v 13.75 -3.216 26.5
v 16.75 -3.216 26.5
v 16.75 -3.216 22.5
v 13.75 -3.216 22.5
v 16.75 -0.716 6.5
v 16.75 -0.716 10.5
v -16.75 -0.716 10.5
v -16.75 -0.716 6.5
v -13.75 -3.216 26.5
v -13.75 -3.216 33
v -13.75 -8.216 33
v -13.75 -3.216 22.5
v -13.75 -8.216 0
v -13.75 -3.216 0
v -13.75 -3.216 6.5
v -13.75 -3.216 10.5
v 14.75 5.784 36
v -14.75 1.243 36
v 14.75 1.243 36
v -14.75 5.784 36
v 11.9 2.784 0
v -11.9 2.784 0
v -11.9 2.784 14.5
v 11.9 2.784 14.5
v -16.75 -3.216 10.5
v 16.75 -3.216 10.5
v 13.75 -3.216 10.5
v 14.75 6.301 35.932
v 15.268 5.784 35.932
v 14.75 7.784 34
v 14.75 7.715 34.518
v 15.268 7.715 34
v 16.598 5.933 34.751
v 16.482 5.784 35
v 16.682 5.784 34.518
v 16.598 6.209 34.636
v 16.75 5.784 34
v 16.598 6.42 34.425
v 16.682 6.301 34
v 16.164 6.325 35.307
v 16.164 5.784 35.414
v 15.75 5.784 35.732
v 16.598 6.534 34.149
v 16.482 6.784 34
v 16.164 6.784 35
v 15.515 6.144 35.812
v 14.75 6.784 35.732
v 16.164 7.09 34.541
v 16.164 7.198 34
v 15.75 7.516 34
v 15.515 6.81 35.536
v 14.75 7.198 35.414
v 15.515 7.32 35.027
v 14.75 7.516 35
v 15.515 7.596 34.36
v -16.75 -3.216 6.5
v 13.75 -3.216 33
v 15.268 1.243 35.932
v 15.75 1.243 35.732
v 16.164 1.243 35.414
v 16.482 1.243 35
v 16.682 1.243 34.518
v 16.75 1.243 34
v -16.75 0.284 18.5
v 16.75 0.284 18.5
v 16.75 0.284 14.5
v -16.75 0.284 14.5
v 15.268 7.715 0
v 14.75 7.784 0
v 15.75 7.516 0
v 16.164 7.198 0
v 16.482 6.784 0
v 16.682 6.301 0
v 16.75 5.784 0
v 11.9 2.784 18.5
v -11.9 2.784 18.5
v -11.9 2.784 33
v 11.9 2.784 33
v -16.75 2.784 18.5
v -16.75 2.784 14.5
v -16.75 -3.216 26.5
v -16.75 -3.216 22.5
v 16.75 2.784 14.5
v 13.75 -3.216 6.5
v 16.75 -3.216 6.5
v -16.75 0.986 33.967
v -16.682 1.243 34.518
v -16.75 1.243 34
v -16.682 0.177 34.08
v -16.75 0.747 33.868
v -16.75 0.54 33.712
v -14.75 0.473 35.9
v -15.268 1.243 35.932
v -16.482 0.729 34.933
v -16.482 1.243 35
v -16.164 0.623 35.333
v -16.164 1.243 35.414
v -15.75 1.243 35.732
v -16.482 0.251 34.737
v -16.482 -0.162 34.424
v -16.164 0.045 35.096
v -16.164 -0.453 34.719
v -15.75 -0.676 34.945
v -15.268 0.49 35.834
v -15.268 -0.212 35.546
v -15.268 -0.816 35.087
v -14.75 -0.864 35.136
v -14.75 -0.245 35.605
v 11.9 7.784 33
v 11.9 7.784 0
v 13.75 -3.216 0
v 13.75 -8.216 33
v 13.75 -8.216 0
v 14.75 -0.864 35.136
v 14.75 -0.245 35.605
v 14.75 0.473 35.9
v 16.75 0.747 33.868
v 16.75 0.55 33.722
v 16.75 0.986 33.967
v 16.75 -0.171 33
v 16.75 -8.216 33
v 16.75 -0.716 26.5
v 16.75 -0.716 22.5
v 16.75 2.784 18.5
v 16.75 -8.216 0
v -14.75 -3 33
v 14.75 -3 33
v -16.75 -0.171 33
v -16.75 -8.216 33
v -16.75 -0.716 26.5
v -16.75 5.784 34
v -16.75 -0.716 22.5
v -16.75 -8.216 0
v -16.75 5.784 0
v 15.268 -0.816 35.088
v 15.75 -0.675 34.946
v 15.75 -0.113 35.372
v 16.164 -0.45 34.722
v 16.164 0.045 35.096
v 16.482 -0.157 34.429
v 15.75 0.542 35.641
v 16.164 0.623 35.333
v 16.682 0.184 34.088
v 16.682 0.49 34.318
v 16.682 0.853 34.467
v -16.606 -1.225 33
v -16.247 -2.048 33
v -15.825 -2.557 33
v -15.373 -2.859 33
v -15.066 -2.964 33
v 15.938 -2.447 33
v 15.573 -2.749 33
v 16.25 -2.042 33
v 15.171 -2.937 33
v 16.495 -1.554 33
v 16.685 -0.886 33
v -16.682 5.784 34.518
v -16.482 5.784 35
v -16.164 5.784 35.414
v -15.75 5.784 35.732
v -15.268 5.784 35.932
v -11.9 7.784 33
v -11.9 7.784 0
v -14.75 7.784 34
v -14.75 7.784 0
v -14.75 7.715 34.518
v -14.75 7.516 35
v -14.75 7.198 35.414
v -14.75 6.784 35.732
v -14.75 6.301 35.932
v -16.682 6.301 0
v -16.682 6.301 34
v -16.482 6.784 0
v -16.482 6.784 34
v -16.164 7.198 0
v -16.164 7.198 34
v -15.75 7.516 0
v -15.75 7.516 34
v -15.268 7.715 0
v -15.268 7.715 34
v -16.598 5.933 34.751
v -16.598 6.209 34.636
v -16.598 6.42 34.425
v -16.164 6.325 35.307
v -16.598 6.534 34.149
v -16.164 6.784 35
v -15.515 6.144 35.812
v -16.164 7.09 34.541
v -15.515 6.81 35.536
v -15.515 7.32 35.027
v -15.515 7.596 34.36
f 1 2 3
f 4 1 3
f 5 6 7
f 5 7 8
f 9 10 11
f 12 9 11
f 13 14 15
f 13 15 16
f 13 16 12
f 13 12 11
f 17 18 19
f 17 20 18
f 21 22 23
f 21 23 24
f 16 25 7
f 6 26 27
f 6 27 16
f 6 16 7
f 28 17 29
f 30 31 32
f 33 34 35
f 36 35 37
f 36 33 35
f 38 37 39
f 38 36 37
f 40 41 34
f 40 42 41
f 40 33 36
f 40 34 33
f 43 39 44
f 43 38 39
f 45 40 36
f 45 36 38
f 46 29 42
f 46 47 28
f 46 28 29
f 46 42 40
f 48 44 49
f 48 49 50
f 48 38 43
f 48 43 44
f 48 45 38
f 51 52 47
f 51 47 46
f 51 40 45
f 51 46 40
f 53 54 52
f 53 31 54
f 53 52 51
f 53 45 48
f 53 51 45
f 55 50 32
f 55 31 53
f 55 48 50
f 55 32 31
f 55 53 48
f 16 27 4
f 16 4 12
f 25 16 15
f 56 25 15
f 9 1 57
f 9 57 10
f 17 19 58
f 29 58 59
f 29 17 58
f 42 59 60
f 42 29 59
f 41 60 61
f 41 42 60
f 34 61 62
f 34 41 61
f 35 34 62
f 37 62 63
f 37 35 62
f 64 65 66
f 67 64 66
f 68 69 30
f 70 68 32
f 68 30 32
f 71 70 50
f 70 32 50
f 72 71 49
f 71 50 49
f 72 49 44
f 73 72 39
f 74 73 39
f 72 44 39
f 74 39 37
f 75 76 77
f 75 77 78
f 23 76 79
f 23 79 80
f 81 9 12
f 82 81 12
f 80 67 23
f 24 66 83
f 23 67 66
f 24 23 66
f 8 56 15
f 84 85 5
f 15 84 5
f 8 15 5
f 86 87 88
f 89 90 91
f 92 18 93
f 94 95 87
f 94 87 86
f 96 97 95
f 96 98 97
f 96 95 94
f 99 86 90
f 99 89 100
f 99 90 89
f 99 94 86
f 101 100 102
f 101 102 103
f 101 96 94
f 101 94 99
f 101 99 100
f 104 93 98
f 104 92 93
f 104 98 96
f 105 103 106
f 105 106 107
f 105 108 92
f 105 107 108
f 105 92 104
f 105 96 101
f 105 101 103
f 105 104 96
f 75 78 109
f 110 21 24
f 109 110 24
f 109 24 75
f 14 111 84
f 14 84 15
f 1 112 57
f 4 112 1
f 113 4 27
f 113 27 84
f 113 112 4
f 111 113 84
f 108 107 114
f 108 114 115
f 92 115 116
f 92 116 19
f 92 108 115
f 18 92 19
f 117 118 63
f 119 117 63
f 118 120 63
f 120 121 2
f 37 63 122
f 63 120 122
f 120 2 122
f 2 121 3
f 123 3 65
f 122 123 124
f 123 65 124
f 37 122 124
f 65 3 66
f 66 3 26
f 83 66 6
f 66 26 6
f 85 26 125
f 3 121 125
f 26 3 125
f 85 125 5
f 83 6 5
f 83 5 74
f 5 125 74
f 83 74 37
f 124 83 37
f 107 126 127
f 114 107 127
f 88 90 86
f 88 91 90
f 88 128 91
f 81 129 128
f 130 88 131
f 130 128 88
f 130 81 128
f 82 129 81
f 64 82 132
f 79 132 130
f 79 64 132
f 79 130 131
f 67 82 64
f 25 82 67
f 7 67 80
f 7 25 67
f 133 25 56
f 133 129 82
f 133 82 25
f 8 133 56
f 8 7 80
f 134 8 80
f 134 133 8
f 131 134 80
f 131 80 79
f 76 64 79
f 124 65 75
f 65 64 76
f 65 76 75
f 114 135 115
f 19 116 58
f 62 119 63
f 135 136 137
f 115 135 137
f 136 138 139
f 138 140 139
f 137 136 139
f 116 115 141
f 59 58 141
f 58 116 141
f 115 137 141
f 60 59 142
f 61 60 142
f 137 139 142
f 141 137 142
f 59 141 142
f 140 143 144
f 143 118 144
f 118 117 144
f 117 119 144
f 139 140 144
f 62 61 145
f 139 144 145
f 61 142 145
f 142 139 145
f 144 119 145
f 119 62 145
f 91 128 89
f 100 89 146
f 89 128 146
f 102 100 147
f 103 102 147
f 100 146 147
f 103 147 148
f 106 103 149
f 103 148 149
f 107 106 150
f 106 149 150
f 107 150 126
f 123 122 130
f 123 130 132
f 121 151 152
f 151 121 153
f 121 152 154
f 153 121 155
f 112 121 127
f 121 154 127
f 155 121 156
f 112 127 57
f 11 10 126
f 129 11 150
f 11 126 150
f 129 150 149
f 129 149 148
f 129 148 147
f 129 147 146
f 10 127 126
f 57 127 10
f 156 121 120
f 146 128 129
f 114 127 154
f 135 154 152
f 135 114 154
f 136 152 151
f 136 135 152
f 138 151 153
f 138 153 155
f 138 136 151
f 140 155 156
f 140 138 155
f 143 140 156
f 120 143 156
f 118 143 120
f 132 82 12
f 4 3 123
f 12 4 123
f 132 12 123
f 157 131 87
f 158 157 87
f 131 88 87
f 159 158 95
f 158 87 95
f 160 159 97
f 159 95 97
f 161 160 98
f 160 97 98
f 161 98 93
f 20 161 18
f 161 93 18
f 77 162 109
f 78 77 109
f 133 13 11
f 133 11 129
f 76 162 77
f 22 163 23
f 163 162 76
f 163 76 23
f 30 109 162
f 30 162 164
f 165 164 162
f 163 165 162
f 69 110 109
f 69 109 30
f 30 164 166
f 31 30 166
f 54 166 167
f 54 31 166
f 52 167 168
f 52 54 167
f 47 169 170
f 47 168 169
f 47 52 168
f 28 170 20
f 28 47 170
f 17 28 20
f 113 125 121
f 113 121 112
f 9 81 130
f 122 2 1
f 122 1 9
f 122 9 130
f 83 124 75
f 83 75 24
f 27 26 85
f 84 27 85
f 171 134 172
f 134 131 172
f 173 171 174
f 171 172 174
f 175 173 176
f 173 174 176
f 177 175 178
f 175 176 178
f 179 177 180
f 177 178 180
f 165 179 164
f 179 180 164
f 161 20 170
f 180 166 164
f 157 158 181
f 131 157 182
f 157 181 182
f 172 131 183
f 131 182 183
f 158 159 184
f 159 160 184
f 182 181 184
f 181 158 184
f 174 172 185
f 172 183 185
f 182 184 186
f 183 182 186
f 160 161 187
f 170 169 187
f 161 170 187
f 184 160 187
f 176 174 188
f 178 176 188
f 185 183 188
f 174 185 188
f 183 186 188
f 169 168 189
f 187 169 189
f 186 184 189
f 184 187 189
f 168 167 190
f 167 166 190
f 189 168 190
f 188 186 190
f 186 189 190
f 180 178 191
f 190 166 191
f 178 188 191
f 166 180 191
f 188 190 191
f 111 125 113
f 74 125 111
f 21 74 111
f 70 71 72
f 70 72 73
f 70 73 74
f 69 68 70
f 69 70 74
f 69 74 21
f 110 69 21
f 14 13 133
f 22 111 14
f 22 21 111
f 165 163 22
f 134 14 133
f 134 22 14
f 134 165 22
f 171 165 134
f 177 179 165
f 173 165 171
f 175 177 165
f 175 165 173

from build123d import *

# Parameters (mm, degrees)
BOSS_EXTRU_1_DEPTH      = 33
ESQUISSE2_W             = 4
ESQUISSE2_H             = 2.5
ENL_V_MAT_EXTRU_1_DEPTH = 48.736346803
ESQUISSE3_W             = 4
ESQUISSE3_H             = 2.5
ENL_V_MAT_EXTRU_2_DEPTH = 48.736346803
ESQUISSE4_W             = 33.5
ESQUISSE4_H             = 7.783625731
BOSS_EXTRU_2_DEPTH      = 3
CHANFREIN1_SIZE         = 3
CONG_3_START            = -18
CONG_3_DEPTH            = 36
CONG_2_R                = 2


with BuildPart() as part:
    # Esquisse1 → Boss.-Extru.1 (new body)
    with BuildSketch(Plane.XY):
        Polygon((-11.9, 2.783625731), (11.9, 2.783625731), (11.9, 7.783625731), (16.75, 7.783625731), (16.75, -8.216374269), (13.75, -8.216374269), (13.75, -3.216374269), (-13.75, -3.216374269), (-13.75, -8.216374269), (-16.75, -8.216374269), (-16.75, 7.783625731), (-11.9, 7.783625731), align=None)
    extrude(amount=BOSS_EXTRU_1_DEPTH)

    # Esquisse2 → Enlèv. mat.-Extru.1 (cut, through all)
    with BuildSketch(Plane(origin=(16.75, 0, 0), x_dir=(0, 0, -1), z_dir=(1, 0, 0))):
        with Locations((-24.5, -1.966374269)):
            Rectangle(ESQUISSE2_W, ESQUISSE2_H)
        with Locations((-8.5, -1.966374269)):
            Rectangle(ESQUISSE2_W, ESQUISSE2_H)
    extrude(amount=-ENL_V_MAT_EXTRU_1_DEPTH, mode=Mode.SUBTRACT)

    # Esquisse3 → Enlèv. mat.-Extru.2 (cut, through all)
    with BuildSketch(Plane(origin=(16.75, 0, 0), x_dir=(0, 0, -1), z_dir=(1, 0, 0))):
        with Locations((-16.5, 1.533625731)):
            Rectangle(ESQUISSE3_W, ESQUISSE3_H)
    extrude(amount=-ENL_V_MAT_EXTRU_2_DEPTH, mode=Mode.SUBTRACT)

    # Esquisse4 → Boss.-Extru.2 (add)
    with BuildSketch(Plane.XY.offset(33)):
        with Locations((0, 3.891812866)):
            Rectangle(ESQUISSE4_W, ESQUISSE4_H)
    extrude(amount=BOSS_EXTRU_2_DEPTH)

    # Chanfrein1
    chanfrein1_edges = [part.edges().sort_by_distance(p)[0] for p in [
        (0, 0, 33),
    ]]
    chamfer(chanfrein1_edges, length=CHANFREIN1_SIZE - 0.0001)  # a hair under: the kernel refuses the full size

    # Congé3: read off the stored shape, not the designer's step
    # Congé3 outline → Congé3 (cut)
    with BuildSketch(Plane.YZ.offset(CONG_3_START)):
        with BuildLine():
            Line((0, 36), (-0.878679656, 35.121320344))
            ThreePointArc((-0.878679656, 35.121320344), (0.09459039, 35.771638598), (1.242640687, 36))
            Line((1.242640687, 36), (0, 36))
        make_face()
    extrude(amount=CONG_3_DEPTH, mode=Mode.SUBTRACT)

    # Congé2
    cong_2_edges = [part.edges().sort_by_distance(p)[0] for p in [
        (0, 7.783625731, 36),
        (-16.75, -1.931982494, 34.067917506),
        (16.75, 4.513133209, 36),
        (16.75, -1.931982494, 34.067917506),
        (16.75, 0.104112039, 35.77556346),
        (-16.75, 0.104112039, 35.77556346),
        (16.75, 7.783625731, 18),
        (-16.75, 7.783625731, 18),
        (-16.75, 4.513133209, 36),
    ]]
    fillet(cong_2_edges, radius=CONG_2_R)


solid = part.part
